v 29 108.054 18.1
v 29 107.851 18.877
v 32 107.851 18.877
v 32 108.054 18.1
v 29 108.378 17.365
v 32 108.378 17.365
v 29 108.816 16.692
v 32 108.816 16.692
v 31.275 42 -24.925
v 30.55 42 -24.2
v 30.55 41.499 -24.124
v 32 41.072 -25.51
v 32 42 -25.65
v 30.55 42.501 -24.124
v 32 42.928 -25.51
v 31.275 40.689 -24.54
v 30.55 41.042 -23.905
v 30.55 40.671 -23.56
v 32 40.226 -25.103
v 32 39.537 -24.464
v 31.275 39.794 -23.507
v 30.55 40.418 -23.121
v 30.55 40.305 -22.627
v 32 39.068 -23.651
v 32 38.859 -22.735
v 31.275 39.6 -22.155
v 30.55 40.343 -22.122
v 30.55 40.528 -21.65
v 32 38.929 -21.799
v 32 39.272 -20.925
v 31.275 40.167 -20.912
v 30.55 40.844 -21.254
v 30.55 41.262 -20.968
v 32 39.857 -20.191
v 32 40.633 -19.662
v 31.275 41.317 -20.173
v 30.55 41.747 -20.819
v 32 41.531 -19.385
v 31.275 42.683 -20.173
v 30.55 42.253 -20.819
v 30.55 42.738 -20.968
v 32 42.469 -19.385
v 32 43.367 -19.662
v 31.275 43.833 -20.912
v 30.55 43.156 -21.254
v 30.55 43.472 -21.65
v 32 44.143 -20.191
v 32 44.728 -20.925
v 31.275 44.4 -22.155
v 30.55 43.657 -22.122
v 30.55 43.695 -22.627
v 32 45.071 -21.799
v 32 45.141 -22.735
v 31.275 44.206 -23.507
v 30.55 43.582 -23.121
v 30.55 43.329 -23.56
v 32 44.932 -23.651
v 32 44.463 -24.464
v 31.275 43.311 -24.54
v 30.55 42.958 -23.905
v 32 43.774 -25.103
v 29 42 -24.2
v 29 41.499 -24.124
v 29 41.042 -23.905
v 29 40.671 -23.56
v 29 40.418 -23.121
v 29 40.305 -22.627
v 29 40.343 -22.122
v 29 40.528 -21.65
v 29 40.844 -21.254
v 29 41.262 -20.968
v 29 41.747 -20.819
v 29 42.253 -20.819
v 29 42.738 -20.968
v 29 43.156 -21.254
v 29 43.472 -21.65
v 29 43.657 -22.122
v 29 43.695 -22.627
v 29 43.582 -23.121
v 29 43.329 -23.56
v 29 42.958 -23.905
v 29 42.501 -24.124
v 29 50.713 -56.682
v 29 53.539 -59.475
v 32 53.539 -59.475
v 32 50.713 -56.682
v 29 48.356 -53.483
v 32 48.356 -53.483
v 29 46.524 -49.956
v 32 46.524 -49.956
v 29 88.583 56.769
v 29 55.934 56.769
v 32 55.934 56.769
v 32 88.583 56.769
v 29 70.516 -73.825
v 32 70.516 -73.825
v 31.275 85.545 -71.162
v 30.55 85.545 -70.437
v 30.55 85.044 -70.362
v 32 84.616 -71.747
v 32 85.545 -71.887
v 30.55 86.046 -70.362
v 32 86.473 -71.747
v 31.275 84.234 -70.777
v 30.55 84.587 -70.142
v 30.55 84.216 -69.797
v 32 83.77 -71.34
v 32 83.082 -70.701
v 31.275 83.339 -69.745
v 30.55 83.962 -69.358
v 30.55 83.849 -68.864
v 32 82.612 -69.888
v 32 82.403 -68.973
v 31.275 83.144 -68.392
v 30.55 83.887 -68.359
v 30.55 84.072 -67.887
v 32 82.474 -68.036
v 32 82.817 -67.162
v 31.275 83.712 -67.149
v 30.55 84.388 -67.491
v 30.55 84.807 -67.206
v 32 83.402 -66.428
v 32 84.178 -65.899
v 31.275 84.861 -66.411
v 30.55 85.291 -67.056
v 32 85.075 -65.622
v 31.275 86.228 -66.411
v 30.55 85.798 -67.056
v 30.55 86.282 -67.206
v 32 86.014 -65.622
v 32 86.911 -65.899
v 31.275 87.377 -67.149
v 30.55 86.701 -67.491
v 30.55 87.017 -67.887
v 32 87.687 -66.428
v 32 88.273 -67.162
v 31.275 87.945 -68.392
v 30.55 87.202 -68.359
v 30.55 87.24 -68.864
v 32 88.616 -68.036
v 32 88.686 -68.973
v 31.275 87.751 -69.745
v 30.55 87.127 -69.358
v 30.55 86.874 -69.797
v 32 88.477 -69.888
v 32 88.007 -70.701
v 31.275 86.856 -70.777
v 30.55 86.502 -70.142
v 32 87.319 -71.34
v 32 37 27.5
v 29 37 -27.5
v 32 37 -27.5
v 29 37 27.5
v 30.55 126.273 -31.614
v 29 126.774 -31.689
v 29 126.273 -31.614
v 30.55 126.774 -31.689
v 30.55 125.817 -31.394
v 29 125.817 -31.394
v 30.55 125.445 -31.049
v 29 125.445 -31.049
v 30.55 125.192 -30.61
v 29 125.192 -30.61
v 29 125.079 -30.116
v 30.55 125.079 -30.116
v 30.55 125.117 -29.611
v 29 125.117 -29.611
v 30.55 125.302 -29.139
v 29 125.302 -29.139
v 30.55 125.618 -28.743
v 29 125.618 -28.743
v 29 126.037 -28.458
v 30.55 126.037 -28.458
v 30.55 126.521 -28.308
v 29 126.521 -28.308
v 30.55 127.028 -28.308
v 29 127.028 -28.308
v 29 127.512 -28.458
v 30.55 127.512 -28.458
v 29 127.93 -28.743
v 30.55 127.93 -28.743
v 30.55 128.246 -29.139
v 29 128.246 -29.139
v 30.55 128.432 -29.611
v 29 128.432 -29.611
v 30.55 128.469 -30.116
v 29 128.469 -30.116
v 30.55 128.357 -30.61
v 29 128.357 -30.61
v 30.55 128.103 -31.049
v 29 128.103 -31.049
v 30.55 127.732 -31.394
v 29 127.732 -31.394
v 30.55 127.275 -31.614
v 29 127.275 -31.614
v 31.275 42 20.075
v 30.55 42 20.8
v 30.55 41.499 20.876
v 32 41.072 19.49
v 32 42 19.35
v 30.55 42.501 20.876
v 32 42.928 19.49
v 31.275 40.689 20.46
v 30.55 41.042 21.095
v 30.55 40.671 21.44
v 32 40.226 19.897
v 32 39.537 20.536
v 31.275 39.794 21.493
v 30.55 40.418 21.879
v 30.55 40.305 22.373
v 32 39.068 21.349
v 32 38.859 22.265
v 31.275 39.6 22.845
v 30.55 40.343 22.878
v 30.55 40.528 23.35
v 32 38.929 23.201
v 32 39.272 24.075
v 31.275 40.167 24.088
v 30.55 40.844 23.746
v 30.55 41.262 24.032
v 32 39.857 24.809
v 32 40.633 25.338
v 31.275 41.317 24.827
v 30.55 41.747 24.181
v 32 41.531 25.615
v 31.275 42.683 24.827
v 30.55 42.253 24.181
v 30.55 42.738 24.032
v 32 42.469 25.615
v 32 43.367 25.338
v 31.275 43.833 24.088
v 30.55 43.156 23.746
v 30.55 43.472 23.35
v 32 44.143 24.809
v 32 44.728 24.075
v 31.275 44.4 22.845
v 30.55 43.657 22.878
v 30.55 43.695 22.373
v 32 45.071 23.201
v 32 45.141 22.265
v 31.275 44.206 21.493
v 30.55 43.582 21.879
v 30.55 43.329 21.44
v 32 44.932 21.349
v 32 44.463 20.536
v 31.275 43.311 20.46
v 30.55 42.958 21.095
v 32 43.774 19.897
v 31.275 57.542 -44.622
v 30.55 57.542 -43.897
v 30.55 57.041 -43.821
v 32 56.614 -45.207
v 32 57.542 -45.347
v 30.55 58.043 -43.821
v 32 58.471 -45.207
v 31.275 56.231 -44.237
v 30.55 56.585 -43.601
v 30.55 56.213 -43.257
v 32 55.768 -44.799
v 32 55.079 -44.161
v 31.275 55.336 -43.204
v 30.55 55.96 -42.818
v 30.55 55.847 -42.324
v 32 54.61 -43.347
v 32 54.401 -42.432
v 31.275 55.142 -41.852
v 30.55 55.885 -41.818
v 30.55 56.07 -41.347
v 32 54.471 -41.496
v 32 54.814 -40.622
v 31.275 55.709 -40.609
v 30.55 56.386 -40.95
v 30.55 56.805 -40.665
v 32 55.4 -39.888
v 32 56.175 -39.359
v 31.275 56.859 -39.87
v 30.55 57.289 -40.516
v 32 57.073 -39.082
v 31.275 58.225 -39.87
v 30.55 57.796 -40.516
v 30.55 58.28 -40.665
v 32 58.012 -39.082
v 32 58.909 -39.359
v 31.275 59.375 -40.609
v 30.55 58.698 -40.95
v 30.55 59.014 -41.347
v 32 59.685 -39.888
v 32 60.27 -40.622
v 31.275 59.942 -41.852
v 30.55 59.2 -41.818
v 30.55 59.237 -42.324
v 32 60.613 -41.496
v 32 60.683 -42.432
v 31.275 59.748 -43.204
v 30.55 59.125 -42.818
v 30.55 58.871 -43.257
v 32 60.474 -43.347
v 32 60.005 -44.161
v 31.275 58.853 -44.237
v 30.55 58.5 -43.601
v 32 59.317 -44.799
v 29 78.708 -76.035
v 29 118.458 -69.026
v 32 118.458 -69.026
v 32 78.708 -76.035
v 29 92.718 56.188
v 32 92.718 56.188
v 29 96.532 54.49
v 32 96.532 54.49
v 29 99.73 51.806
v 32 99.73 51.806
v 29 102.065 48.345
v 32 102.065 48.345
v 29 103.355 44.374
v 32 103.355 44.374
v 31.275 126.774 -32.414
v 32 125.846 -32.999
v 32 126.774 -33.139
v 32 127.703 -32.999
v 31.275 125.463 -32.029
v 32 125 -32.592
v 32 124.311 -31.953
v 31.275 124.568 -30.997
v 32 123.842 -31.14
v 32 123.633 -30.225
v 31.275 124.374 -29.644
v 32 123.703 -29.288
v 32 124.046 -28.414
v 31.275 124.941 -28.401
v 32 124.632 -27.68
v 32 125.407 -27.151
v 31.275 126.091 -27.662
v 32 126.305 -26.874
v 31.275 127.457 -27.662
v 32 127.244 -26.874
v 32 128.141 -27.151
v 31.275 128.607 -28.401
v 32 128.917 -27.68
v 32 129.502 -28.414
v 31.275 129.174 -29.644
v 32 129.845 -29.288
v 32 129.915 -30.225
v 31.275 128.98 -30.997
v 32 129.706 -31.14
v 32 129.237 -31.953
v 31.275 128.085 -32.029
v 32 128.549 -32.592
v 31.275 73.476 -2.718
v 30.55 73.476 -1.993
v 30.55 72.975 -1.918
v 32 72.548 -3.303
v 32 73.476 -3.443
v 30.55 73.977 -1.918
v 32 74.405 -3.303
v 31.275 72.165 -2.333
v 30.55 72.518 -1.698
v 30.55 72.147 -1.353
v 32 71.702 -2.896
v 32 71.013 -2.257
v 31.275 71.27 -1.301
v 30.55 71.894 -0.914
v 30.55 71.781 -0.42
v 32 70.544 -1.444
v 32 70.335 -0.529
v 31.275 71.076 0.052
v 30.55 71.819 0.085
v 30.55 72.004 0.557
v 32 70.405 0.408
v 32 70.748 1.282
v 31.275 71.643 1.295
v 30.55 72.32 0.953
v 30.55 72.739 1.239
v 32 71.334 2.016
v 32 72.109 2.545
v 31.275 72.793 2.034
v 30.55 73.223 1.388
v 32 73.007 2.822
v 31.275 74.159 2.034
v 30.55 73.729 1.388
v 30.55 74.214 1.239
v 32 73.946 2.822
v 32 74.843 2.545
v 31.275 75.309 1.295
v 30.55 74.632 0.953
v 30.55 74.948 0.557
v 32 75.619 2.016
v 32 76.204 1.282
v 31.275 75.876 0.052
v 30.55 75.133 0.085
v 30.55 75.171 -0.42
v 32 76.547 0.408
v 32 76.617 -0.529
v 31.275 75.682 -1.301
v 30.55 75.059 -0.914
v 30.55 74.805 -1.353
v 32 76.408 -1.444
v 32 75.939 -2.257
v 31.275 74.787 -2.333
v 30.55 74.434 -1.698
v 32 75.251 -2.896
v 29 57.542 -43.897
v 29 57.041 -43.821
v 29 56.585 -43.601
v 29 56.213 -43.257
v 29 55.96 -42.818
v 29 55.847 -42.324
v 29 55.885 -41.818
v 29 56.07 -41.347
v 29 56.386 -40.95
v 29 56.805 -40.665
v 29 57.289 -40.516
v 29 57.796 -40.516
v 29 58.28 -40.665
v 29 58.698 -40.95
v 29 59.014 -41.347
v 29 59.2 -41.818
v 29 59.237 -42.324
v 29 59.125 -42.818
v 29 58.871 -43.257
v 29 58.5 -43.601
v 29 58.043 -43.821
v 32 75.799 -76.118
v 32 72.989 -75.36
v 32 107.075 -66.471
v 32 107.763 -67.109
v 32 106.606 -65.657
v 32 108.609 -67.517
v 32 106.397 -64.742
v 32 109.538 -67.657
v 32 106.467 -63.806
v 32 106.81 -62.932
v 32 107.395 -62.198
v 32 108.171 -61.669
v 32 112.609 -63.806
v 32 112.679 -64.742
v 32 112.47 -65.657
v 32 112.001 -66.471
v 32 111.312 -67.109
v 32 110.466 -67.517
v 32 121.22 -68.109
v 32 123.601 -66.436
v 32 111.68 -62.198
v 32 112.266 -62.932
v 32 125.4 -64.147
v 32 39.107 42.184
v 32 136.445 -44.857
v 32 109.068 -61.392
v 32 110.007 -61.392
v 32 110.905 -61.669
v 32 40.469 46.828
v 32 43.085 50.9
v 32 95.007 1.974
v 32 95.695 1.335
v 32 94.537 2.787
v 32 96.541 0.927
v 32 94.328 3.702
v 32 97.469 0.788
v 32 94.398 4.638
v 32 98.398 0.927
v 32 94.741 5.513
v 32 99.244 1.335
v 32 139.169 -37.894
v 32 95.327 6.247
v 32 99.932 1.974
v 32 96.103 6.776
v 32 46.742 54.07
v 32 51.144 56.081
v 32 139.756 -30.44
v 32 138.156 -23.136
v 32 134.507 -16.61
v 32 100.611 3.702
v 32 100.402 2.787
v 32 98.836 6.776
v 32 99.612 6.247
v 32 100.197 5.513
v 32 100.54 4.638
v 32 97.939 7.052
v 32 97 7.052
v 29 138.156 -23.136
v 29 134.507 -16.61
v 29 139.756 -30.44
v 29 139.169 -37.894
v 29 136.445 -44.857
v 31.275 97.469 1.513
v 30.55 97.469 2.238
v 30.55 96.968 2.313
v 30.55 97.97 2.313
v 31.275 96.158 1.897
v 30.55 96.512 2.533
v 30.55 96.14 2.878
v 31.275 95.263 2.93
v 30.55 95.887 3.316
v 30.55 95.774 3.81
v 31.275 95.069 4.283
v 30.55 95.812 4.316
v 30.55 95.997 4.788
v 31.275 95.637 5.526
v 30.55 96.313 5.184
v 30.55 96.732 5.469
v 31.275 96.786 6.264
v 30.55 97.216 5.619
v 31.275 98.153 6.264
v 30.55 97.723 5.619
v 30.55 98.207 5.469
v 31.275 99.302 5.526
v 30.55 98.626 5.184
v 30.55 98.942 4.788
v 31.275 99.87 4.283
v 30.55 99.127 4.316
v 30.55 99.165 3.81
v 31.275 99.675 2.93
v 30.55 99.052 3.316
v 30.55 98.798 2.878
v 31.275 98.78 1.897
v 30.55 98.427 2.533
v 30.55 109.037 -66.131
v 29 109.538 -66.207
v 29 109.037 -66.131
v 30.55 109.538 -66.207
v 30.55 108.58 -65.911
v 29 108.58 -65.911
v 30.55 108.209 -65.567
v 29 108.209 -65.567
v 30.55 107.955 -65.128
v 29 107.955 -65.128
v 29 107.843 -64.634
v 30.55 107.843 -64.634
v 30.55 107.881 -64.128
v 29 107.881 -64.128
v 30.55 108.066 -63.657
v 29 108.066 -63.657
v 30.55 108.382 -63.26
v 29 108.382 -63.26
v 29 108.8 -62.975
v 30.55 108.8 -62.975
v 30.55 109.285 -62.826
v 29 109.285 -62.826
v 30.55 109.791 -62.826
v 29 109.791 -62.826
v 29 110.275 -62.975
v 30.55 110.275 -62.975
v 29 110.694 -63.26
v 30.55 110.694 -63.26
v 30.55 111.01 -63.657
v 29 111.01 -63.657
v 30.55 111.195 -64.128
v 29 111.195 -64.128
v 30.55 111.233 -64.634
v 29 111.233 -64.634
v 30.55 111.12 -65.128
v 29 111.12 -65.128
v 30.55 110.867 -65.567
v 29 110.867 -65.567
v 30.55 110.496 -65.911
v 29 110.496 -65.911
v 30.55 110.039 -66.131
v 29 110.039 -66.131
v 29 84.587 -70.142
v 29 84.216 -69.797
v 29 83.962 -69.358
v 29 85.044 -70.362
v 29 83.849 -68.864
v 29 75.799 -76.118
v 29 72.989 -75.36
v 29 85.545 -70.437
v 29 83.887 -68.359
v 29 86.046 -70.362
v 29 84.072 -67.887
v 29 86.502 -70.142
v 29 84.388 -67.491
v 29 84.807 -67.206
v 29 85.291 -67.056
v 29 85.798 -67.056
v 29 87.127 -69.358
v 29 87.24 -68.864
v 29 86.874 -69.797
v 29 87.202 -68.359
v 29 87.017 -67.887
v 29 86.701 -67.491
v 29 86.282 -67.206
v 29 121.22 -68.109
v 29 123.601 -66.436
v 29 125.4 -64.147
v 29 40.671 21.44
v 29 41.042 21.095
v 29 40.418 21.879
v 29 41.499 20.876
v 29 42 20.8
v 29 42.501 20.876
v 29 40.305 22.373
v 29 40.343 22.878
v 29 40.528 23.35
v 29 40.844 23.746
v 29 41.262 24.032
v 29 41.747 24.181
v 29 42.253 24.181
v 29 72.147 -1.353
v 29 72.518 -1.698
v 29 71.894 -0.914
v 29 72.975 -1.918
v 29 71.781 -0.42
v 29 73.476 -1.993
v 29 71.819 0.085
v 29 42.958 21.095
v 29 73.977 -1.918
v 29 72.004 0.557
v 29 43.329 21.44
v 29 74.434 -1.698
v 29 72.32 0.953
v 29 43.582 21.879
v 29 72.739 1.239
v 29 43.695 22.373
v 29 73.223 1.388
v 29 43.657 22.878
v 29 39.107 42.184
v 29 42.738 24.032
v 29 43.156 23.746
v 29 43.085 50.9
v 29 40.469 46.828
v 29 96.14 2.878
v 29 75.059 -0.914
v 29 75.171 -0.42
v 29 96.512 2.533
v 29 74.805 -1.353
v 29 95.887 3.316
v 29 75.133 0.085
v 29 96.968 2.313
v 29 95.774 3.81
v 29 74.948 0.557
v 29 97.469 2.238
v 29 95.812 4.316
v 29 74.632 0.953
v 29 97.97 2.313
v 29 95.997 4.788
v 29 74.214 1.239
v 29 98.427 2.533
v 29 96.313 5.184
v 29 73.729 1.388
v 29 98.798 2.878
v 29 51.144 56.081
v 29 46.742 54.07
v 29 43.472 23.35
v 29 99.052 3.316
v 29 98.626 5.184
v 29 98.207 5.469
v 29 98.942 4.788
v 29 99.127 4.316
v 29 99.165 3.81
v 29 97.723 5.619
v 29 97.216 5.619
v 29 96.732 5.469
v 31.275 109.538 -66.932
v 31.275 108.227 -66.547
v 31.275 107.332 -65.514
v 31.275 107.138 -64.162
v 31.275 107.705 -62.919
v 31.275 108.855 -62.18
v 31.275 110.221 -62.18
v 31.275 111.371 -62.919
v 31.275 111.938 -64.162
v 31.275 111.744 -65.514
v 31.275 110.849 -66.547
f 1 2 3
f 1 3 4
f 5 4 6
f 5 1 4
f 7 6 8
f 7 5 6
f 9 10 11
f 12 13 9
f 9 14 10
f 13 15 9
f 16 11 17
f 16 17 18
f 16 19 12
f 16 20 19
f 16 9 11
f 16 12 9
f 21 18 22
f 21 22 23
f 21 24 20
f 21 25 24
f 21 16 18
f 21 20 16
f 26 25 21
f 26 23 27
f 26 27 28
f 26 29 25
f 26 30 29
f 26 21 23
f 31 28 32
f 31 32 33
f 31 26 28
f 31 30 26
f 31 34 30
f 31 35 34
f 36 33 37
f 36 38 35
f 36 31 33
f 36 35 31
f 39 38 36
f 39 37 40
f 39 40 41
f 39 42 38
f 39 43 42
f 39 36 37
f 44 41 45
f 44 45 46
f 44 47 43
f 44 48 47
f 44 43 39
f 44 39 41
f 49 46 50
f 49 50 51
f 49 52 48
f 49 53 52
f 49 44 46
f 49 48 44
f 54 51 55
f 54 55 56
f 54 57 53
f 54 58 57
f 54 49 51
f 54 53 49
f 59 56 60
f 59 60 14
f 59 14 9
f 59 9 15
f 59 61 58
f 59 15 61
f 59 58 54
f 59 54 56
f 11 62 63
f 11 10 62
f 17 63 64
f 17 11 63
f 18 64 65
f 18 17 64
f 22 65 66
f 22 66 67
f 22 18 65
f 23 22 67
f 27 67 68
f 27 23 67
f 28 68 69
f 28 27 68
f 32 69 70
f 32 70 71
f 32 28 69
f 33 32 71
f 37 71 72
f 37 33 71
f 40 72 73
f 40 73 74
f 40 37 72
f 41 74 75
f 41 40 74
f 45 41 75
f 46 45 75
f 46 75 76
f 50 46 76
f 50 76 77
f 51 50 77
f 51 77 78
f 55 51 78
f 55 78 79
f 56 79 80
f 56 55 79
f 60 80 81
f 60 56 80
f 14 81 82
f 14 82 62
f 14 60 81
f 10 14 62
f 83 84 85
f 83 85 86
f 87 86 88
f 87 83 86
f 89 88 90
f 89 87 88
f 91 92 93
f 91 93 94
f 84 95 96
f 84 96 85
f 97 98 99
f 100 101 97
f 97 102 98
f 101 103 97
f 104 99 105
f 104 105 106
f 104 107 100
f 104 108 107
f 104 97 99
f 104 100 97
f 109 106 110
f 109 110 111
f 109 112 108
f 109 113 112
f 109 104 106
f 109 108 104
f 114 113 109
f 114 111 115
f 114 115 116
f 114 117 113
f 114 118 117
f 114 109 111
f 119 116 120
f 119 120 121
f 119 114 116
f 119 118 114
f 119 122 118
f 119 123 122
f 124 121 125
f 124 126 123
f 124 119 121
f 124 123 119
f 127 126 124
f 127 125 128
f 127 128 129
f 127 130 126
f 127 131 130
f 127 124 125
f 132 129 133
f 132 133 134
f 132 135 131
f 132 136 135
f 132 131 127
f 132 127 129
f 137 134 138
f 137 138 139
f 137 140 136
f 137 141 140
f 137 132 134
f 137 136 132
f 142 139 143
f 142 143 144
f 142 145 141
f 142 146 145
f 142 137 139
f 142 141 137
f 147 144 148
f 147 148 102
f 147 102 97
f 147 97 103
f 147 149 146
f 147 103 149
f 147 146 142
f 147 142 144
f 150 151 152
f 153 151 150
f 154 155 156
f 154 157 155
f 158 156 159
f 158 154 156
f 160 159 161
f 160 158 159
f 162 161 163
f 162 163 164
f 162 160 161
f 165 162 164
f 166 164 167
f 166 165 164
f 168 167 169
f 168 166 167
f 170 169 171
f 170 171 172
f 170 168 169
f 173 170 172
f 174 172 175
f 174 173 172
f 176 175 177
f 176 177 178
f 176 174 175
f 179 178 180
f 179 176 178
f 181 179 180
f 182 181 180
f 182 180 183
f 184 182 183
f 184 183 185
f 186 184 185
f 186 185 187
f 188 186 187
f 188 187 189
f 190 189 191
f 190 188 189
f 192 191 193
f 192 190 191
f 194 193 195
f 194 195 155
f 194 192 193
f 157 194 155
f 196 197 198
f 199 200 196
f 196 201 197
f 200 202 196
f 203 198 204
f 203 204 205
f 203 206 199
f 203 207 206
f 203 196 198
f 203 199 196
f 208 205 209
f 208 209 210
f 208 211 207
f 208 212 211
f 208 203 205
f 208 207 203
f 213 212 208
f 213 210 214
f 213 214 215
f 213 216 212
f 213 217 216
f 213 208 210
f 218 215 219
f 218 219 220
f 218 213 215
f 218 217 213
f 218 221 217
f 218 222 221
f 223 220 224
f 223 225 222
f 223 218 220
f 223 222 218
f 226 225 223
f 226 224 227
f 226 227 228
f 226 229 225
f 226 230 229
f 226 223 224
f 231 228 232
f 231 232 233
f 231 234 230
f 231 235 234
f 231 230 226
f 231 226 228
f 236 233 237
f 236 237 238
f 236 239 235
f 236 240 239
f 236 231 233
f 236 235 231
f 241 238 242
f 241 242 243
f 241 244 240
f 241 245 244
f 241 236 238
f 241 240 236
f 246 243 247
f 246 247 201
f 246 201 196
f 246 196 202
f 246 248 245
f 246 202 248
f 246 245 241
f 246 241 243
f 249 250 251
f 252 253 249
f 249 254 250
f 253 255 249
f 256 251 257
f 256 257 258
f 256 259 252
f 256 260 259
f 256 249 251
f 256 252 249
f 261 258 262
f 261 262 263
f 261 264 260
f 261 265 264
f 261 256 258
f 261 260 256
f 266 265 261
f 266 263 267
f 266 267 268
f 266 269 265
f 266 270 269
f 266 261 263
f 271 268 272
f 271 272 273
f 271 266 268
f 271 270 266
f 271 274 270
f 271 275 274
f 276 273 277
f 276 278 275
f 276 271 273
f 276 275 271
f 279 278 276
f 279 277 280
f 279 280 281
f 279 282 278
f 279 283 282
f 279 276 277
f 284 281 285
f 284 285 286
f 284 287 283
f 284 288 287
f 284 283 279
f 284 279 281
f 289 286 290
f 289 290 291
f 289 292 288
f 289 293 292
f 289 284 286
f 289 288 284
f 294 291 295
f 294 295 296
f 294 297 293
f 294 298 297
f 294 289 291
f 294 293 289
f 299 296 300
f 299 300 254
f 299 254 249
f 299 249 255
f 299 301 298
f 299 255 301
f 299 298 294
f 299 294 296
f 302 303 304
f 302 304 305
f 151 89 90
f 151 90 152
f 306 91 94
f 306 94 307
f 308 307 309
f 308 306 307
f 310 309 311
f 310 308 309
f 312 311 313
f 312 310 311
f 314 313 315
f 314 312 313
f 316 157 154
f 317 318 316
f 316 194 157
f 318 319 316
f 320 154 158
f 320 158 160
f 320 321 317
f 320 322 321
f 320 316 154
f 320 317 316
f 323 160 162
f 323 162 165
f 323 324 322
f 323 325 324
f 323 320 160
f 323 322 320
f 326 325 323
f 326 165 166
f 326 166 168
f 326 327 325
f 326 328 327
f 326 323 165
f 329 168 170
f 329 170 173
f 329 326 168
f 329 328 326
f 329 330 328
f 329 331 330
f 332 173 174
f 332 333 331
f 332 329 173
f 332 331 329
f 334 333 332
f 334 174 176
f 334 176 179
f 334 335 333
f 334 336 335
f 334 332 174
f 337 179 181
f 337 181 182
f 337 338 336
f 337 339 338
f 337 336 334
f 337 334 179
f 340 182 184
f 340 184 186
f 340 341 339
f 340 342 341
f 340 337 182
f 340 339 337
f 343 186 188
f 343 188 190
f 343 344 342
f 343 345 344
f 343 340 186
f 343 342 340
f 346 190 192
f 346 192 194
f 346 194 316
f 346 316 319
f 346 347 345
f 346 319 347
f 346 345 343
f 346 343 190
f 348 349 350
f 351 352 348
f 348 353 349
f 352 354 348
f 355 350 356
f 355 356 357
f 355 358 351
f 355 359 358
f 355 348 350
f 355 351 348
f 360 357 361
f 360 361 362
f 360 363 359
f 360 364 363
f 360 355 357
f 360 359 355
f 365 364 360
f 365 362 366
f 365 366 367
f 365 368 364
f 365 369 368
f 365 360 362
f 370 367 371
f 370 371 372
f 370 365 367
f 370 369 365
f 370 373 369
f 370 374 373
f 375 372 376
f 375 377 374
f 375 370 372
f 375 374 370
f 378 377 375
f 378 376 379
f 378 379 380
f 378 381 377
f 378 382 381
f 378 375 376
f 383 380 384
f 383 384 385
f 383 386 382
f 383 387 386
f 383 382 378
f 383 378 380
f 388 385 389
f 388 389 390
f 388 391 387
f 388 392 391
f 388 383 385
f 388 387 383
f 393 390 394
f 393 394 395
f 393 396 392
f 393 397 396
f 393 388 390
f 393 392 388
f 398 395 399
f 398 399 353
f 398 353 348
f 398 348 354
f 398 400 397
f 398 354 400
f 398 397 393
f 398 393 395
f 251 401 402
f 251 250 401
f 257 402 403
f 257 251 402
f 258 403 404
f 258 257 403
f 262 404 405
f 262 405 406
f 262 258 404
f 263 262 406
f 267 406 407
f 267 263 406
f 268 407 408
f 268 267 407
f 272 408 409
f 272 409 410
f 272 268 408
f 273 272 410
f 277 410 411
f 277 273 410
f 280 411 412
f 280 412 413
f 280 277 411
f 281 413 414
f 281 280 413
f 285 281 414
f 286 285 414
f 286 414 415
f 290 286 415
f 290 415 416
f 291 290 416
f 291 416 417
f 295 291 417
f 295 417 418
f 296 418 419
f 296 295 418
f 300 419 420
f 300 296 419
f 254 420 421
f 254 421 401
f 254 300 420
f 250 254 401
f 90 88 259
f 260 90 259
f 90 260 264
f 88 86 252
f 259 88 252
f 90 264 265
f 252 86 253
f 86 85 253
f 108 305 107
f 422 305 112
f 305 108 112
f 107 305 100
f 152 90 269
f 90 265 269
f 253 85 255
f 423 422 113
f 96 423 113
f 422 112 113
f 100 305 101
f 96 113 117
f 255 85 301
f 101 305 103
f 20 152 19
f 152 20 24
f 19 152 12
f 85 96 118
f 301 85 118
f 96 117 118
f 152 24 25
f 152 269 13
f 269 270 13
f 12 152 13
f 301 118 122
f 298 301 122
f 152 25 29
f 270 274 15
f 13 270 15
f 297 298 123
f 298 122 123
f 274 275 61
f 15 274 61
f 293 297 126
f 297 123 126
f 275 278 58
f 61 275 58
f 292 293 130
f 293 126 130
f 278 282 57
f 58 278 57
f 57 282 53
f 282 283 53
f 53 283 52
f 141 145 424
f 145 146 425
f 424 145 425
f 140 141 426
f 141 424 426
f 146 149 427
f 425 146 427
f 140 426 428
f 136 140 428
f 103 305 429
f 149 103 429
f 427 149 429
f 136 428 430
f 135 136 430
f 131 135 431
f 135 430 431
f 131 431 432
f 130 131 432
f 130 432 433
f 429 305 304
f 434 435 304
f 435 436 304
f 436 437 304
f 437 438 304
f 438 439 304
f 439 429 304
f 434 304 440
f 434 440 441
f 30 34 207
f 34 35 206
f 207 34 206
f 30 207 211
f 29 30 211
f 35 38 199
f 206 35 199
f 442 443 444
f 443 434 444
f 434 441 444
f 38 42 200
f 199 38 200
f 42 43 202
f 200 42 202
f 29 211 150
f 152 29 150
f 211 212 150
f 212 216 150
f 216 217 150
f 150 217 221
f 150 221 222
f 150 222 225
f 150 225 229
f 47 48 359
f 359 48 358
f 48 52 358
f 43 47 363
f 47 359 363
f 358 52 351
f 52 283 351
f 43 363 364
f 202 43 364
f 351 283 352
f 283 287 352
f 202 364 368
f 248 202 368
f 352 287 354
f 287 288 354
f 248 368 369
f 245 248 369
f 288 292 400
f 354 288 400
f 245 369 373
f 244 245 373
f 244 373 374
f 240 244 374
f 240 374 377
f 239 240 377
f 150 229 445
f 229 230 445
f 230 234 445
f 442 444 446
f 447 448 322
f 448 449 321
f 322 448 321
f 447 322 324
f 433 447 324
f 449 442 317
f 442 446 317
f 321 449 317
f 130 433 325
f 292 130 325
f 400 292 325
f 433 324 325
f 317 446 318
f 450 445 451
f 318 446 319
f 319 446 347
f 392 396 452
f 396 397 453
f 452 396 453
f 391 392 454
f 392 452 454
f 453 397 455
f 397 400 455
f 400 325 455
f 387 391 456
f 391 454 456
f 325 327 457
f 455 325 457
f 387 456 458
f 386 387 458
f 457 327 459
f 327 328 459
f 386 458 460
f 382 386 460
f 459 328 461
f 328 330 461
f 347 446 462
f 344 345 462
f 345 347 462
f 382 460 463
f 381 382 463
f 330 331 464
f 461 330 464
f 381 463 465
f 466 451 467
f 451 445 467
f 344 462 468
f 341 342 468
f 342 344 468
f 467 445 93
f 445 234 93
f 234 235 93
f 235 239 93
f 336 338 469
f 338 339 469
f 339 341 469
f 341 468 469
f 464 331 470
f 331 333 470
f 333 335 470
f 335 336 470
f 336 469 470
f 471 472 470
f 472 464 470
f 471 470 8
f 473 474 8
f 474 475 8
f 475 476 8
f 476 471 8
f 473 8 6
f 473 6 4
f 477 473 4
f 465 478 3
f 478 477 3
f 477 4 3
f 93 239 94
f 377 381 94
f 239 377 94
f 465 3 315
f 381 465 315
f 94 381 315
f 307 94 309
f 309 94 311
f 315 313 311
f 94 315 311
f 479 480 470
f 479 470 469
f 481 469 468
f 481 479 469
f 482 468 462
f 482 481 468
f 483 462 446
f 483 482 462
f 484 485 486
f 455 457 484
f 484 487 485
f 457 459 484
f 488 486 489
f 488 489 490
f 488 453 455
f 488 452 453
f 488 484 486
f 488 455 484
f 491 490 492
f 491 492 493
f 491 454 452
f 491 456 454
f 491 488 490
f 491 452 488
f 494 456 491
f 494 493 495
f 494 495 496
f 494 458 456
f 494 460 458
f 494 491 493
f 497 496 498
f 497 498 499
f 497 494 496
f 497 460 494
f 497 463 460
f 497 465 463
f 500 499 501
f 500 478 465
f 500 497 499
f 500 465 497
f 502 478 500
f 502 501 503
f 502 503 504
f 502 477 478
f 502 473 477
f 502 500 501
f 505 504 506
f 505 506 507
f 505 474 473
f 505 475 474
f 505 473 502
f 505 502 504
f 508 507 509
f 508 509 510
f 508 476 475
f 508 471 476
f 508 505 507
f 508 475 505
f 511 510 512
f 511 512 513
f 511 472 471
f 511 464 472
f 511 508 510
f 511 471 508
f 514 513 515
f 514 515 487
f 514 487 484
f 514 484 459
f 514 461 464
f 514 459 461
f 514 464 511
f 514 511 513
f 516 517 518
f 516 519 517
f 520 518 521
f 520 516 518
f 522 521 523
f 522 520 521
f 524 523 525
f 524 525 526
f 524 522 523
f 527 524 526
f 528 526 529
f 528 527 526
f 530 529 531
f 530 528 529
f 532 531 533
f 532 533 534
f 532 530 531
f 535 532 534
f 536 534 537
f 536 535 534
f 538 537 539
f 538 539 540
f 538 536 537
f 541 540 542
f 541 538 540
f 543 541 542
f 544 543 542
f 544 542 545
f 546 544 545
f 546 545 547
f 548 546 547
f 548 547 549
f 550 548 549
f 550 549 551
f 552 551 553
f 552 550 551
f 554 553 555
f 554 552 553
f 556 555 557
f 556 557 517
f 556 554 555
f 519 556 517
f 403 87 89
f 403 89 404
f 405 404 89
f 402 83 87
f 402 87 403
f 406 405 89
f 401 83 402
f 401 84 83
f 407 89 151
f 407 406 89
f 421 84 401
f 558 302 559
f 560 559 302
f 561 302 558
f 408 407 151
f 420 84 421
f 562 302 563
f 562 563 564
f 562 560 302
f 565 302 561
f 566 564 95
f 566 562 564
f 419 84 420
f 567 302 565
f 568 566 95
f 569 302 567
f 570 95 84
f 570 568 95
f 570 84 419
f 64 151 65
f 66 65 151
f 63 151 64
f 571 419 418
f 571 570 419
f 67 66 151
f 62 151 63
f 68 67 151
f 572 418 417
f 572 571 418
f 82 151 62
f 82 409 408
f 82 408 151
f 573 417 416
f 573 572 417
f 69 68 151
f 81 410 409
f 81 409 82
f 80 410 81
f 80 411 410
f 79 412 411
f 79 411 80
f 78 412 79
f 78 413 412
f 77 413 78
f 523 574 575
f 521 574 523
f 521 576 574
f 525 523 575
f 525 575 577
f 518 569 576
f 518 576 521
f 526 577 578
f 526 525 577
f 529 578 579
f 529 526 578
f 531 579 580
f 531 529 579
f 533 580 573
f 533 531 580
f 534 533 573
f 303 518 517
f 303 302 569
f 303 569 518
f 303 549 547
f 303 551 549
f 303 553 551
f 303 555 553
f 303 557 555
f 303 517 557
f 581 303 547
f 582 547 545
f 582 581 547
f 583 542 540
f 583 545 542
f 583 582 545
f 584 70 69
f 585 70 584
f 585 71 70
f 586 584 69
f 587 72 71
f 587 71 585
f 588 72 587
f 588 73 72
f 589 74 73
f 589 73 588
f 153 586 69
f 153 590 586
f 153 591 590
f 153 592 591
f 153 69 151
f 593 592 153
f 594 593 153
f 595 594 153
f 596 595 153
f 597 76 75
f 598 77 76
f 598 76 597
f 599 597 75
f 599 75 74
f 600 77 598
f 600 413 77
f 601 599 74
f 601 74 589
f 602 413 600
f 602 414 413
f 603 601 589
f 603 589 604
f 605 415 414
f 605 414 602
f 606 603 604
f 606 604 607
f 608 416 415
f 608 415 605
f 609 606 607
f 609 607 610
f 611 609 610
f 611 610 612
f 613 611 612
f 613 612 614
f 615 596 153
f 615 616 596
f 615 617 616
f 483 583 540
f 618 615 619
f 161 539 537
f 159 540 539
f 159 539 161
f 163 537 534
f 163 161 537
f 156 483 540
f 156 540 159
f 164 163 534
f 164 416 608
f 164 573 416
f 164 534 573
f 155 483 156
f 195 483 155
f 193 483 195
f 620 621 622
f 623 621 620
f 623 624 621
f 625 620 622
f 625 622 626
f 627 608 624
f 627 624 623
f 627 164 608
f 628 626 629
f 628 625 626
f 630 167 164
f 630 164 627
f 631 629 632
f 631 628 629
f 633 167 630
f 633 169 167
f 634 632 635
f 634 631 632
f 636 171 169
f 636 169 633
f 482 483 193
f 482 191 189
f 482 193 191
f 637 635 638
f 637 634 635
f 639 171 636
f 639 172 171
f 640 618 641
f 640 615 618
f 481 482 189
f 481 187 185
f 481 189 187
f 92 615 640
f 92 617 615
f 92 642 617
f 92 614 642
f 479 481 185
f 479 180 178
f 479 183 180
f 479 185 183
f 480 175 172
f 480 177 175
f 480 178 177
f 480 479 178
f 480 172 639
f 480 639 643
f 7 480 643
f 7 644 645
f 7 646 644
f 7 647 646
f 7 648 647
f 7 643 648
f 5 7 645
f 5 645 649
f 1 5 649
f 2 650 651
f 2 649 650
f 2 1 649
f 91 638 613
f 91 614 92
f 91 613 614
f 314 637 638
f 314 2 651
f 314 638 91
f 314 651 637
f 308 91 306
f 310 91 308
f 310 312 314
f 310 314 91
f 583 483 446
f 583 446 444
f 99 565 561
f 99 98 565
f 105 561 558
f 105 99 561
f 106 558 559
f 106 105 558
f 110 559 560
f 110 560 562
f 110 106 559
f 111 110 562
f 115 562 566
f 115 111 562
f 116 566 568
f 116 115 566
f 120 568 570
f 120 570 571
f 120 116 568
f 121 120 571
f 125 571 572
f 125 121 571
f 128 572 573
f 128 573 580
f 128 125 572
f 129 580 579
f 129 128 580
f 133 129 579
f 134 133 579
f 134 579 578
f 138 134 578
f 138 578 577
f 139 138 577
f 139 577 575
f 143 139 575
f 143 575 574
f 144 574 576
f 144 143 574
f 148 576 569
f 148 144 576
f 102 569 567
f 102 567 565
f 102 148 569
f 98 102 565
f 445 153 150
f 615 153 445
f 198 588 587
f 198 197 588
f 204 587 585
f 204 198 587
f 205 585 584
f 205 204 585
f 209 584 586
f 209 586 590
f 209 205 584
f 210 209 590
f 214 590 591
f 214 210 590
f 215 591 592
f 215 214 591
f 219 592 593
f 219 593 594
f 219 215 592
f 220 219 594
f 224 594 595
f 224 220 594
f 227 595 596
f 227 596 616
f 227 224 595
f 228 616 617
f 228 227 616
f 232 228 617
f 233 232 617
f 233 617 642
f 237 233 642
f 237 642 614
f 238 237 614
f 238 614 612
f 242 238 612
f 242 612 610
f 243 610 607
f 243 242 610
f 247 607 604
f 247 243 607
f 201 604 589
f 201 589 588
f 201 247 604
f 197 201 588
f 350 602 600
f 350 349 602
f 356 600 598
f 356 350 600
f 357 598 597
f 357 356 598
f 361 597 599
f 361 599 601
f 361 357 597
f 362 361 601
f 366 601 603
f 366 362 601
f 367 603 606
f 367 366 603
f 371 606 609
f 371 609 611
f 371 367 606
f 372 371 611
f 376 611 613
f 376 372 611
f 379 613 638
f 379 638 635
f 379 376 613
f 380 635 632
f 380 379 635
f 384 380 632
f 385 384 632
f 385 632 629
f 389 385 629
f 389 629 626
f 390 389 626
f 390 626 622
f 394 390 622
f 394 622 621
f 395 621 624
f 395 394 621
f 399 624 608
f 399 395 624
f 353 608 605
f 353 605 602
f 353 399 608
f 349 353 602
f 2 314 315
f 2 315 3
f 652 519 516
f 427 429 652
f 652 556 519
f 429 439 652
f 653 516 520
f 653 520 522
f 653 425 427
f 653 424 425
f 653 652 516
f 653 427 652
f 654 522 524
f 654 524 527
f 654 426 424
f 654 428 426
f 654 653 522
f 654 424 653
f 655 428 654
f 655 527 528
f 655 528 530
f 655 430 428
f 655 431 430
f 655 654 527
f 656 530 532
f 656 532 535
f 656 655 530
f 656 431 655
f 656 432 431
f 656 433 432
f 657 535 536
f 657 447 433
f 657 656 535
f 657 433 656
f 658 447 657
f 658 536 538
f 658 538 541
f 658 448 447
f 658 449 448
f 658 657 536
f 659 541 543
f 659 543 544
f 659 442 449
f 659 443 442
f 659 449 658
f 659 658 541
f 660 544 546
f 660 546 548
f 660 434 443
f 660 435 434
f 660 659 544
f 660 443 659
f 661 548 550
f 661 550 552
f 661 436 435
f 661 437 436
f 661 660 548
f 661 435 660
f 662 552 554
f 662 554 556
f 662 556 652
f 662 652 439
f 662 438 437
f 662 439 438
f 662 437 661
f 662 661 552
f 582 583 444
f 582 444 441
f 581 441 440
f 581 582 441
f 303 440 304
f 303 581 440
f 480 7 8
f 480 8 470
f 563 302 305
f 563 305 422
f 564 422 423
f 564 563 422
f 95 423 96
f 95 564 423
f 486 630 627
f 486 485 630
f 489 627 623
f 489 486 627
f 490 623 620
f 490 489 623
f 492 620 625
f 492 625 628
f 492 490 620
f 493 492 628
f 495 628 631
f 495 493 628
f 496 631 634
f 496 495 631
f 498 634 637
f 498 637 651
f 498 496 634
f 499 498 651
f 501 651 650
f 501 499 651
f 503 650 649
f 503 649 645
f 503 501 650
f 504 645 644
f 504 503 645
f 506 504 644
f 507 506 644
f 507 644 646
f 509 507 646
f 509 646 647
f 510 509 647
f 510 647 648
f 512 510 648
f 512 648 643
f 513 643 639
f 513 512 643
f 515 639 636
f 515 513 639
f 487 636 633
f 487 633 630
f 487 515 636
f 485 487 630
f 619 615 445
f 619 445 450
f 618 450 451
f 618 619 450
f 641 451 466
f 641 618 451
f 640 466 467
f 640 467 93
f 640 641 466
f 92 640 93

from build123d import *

# Parameters (mm, degrees)
BOSS_EXTRUDE1_DEPTH                            = 3
CSK_FOR_M3_FLAT_HEAD_MACHINE_SCREW1_AT_2_COUNT = 2
CSK_FOR_M3_FLAT_HEAD_MACHINE_SCREW1_AT_2_PITCH = 24.36335345
CSK_FOR_M3_FLAT_HEAD_MACHINE_SCREW1_AT_3_COUNT = 2
CSK_FOR_M3_FLAT_HEAD_MACHINE_SCREW1_AT_3_PITCH = 69.5
CSK_FOR_M3_FLAT_HEAD_MACHINE_SCREW1_AT_4_COUNT = 2
CSK_FOR_M3_FLAT_HEAD_MACHINE_SCREW1_AT_4_PITCH = 73.646608824
CSK_FOR_M3_FLAT_HEAD_MACHINE_SCREW1_AT_5_COUNT = 2
CSK_FOR_M3_FLAT_HEAD_MACHINE_SCREW1_AT_5_PITCH = 56.579922425
CSK_FOR_M3_FLAT_HEAD_MACHINE_SCREW1_AT_6_COUNT = 2
CSK_FOR_M3_FLAT_HEAD_MACHINE_SCREW1_AT_6_PITCH = 38.581652039
CSK_FOR_M3_FLAT_HEAD_MACHINE_SCREW1_AT_7_COUNT = 2
CSK_FOR_M3_FLAT_HEAD_MACHINE_SCREW1_AT_7_PITCH = 110.143173396
CSK_FOR_M3_FLAT_HEAD_MACHINE_SCREW1_AT_8_COUNT = 2
CSK_FOR_M3_FLAT_HEAD_MACHINE_SCREW1_AT_8_PITCH = 79.535664399


with BuildPart() as part:
    # Sketch2 → Boss-Extrude1 (new body)
    with BuildSketch(Plane(origin=(29, 0, 0), x_dir=(0, 0, -1), z_dir=(1, 0, 0))):
        with BuildLine():
            Line((-16.691511003, 108.816260881), (16.610141275, 134.506640075))
            ThreePointArc((16.610141275, 134.506640075), (30.439693581, 139.756494337), (44.856843921, 136.445412513))
            Line((44.856843921, 136.445412513), (64.147238229, 125.399811115))
            ThreePointArc((64.147238229, 125.399811115), (67.359474123, 122.47213667), (69.026291478, 118.458228724))
            Line((69.026291478, 118.458228724), (76.03531425, 78.708085309))
            ThreePointArc((76.03531425, 78.708085309), (75.841855651, 74.366160521), (73.824664919, 70.516397068))
            Line((73.824664919, 70.516397068), (59.475441909, 53.539223516))
            ThreePointArc((59.475441909, 53.539223516), (55.128189361, 49.472265428), (49.95644752, 46.524072909))
            Line((49.95644752, 46.524072909), (27.5, 37))
            Line((27.5, 37), (-27.5, 37))
            Line((-27.5, 37), (-42.183846688, 39.106824497))
            ThreePointArc((-42.183846688, 39.106824497), (-52.615538646, 44.799981854), (-56.769427994, 55.934497609))
            Line((-56.769427994, 55.934497609), (-56.769427994, 88.583208534))
            ThreePointArc((-56.769427994, 88.583208534), (-53.260094641, 98.225022679), (-44.374150659, 103.355324829))
            Line((-44.374150659, 103.355324829), (-18.877327121, 107.851102741))
            ThreePointArc((-18.877327121, 107.851102741), (-17.725917606, 108.201192201), (-16.691511003, 108.816260881))
        make_face()
    extrude(amount=BOSS_EXTRUDE1_DEPTH)

    # Sketch4 → CSK for M3 Flat Head Machine Screw1 (revolve, cut)
    with BuildSketch(Plane(origin=(32, 109.537877634, -64.506630382), x_dir=(0, 0, -1), z_dir=(0, 1, 0))):
        Polygon((0, 0), (0, 3), (1.7, 3), (1.7, 1.45), (3.15, 0), align=None)
    csk_for_m3_flat_head_machine_screw1 = revolve(axis=Axis((38.35, 109.537877634, -64.506630382), (-1, 0, 0)), mode=Mode.SUBTRACT)

    # CSK for M3 Flat Head Machine Screw1 at 2: CSK for M3 Flat Head Machine Screw1 ×2
    with Locations(*[Vector(0, -0.984807753, -0.173648178) * (i * CSK_FOR_M3_FLAT_HEAD_MACHINE_SCREW1_AT_2_PITCH) for i in range(1, CSK_FOR_M3_FLAT_HEAD_MACHINE_SCREW1_AT_2_COUNT)]):
        add(csk_for_m3_flat_head_machine_screw1, mode=Mode.SUBTRACT)

    # CSK for M3 Flat Head Machine Screw1 at 3: CSK for M3 Flat Head Machine Screw1 ×2
    with Locations(*[Vector(0, -0.173648178, 0.984807753) * (i * CSK_FOR_M3_FLAT_HEAD_MACHINE_SCREW1_AT_3_PITCH) for i in range(1, CSK_FOR_M3_FLAT_HEAD_MACHINE_SCREW1_AT_3_COUNT)]):
        add(csk_for_m3_flat_head_machine_screw1, mode=Mode.SUBTRACT)

    # CSK for M3 Flat Head Machine Screw1 at 4: CSK for M3 Flat Head Machine Screw1 ×2
    with Locations(*[Vector(0, -0.489659582, 0.871913696) * (i * CSK_FOR_M3_FLAT_HEAD_MACHINE_SCREW1_AT_4_PITCH) for i in range(1, CSK_FOR_M3_FLAT_HEAD_MACHINE_SCREW1_AT_4_COUNT)]):
        add(csk_for_m3_flat_head_machine_screw1, mode=Mode.SUBTRACT)

    # CSK for M3 Flat Head Machine Screw1 at 5: CSK for M3 Flat Head Machine Screw1 ×2
    with Locations(*[Vector(0, -0.918977854, 0.394309147) * (i * CSK_FOR_M3_FLAT_HEAD_MACHINE_SCREW1_AT_5_PITCH) for i in range(1, CSK_FOR_M3_FLAT_HEAD_MACHINE_SCREW1_AT_5_COUNT)]):
        add(csk_for_m3_flat_head_machine_screw1, mode=Mode.SUBTRACT)

    # CSK for M3 Flat Head Machine Screw1 at 6: CSK for M3 Flat Head Machine Screw1 ×2
    with Locations(*[Vector(0, 0.446748348, 0.894659663) * (i * CSK_FOR_M3_FLAT_HEAD_MACHINE_SCREW1_AT_6_PITCH) for i in range(1, CSK_FOR_M3_FLAT_HEAD_MACHINE_SCREW1_AT_6_COUNT)]):
        add(csk_for_m3_flat_head_machine_screw1, mode=Mode.SUBTRACT)

    # CSK for M3 Flat Head Machine Screw1 at 7: CSK for M3 Flat Head Machine Screw1 ×2
    with Locations(*[Vector(0, -0.613182602, 0.789941198) * (i * CSK_FOR_M3_FLAT_HEAD_MACHINE_SCREW1_AT_7_PITCH) for i in range(1, CSK_FOR_M3_FLAT_HEAD_MACHINE_SCREW1_AT_7_COUNT)]):
        add(csk_for_m3_flat_head_machine_screw1, mode=Mode.SUBTRACT)

    # CSK for M3 Flat Head Machine Screw1 at 8: CSK for M3 Flat Head Machine Screw1 ×2
    with Locations(*[Vector(0, -0.849152115, 0.528148356) * (i * CSK_FOR_M3_FLAT_HEAD_MACHINE_SCREW1_AT_8_PITCH) for i in range(1, CSK_FOR_M3_FLAT_HEAD_MACHINE_SCREW1_AT_8_COUNT)]):
        add(csk_for_m3_flat_head_machine_screw1, mode=Mode.SUBTRACT)


solid = part.part
